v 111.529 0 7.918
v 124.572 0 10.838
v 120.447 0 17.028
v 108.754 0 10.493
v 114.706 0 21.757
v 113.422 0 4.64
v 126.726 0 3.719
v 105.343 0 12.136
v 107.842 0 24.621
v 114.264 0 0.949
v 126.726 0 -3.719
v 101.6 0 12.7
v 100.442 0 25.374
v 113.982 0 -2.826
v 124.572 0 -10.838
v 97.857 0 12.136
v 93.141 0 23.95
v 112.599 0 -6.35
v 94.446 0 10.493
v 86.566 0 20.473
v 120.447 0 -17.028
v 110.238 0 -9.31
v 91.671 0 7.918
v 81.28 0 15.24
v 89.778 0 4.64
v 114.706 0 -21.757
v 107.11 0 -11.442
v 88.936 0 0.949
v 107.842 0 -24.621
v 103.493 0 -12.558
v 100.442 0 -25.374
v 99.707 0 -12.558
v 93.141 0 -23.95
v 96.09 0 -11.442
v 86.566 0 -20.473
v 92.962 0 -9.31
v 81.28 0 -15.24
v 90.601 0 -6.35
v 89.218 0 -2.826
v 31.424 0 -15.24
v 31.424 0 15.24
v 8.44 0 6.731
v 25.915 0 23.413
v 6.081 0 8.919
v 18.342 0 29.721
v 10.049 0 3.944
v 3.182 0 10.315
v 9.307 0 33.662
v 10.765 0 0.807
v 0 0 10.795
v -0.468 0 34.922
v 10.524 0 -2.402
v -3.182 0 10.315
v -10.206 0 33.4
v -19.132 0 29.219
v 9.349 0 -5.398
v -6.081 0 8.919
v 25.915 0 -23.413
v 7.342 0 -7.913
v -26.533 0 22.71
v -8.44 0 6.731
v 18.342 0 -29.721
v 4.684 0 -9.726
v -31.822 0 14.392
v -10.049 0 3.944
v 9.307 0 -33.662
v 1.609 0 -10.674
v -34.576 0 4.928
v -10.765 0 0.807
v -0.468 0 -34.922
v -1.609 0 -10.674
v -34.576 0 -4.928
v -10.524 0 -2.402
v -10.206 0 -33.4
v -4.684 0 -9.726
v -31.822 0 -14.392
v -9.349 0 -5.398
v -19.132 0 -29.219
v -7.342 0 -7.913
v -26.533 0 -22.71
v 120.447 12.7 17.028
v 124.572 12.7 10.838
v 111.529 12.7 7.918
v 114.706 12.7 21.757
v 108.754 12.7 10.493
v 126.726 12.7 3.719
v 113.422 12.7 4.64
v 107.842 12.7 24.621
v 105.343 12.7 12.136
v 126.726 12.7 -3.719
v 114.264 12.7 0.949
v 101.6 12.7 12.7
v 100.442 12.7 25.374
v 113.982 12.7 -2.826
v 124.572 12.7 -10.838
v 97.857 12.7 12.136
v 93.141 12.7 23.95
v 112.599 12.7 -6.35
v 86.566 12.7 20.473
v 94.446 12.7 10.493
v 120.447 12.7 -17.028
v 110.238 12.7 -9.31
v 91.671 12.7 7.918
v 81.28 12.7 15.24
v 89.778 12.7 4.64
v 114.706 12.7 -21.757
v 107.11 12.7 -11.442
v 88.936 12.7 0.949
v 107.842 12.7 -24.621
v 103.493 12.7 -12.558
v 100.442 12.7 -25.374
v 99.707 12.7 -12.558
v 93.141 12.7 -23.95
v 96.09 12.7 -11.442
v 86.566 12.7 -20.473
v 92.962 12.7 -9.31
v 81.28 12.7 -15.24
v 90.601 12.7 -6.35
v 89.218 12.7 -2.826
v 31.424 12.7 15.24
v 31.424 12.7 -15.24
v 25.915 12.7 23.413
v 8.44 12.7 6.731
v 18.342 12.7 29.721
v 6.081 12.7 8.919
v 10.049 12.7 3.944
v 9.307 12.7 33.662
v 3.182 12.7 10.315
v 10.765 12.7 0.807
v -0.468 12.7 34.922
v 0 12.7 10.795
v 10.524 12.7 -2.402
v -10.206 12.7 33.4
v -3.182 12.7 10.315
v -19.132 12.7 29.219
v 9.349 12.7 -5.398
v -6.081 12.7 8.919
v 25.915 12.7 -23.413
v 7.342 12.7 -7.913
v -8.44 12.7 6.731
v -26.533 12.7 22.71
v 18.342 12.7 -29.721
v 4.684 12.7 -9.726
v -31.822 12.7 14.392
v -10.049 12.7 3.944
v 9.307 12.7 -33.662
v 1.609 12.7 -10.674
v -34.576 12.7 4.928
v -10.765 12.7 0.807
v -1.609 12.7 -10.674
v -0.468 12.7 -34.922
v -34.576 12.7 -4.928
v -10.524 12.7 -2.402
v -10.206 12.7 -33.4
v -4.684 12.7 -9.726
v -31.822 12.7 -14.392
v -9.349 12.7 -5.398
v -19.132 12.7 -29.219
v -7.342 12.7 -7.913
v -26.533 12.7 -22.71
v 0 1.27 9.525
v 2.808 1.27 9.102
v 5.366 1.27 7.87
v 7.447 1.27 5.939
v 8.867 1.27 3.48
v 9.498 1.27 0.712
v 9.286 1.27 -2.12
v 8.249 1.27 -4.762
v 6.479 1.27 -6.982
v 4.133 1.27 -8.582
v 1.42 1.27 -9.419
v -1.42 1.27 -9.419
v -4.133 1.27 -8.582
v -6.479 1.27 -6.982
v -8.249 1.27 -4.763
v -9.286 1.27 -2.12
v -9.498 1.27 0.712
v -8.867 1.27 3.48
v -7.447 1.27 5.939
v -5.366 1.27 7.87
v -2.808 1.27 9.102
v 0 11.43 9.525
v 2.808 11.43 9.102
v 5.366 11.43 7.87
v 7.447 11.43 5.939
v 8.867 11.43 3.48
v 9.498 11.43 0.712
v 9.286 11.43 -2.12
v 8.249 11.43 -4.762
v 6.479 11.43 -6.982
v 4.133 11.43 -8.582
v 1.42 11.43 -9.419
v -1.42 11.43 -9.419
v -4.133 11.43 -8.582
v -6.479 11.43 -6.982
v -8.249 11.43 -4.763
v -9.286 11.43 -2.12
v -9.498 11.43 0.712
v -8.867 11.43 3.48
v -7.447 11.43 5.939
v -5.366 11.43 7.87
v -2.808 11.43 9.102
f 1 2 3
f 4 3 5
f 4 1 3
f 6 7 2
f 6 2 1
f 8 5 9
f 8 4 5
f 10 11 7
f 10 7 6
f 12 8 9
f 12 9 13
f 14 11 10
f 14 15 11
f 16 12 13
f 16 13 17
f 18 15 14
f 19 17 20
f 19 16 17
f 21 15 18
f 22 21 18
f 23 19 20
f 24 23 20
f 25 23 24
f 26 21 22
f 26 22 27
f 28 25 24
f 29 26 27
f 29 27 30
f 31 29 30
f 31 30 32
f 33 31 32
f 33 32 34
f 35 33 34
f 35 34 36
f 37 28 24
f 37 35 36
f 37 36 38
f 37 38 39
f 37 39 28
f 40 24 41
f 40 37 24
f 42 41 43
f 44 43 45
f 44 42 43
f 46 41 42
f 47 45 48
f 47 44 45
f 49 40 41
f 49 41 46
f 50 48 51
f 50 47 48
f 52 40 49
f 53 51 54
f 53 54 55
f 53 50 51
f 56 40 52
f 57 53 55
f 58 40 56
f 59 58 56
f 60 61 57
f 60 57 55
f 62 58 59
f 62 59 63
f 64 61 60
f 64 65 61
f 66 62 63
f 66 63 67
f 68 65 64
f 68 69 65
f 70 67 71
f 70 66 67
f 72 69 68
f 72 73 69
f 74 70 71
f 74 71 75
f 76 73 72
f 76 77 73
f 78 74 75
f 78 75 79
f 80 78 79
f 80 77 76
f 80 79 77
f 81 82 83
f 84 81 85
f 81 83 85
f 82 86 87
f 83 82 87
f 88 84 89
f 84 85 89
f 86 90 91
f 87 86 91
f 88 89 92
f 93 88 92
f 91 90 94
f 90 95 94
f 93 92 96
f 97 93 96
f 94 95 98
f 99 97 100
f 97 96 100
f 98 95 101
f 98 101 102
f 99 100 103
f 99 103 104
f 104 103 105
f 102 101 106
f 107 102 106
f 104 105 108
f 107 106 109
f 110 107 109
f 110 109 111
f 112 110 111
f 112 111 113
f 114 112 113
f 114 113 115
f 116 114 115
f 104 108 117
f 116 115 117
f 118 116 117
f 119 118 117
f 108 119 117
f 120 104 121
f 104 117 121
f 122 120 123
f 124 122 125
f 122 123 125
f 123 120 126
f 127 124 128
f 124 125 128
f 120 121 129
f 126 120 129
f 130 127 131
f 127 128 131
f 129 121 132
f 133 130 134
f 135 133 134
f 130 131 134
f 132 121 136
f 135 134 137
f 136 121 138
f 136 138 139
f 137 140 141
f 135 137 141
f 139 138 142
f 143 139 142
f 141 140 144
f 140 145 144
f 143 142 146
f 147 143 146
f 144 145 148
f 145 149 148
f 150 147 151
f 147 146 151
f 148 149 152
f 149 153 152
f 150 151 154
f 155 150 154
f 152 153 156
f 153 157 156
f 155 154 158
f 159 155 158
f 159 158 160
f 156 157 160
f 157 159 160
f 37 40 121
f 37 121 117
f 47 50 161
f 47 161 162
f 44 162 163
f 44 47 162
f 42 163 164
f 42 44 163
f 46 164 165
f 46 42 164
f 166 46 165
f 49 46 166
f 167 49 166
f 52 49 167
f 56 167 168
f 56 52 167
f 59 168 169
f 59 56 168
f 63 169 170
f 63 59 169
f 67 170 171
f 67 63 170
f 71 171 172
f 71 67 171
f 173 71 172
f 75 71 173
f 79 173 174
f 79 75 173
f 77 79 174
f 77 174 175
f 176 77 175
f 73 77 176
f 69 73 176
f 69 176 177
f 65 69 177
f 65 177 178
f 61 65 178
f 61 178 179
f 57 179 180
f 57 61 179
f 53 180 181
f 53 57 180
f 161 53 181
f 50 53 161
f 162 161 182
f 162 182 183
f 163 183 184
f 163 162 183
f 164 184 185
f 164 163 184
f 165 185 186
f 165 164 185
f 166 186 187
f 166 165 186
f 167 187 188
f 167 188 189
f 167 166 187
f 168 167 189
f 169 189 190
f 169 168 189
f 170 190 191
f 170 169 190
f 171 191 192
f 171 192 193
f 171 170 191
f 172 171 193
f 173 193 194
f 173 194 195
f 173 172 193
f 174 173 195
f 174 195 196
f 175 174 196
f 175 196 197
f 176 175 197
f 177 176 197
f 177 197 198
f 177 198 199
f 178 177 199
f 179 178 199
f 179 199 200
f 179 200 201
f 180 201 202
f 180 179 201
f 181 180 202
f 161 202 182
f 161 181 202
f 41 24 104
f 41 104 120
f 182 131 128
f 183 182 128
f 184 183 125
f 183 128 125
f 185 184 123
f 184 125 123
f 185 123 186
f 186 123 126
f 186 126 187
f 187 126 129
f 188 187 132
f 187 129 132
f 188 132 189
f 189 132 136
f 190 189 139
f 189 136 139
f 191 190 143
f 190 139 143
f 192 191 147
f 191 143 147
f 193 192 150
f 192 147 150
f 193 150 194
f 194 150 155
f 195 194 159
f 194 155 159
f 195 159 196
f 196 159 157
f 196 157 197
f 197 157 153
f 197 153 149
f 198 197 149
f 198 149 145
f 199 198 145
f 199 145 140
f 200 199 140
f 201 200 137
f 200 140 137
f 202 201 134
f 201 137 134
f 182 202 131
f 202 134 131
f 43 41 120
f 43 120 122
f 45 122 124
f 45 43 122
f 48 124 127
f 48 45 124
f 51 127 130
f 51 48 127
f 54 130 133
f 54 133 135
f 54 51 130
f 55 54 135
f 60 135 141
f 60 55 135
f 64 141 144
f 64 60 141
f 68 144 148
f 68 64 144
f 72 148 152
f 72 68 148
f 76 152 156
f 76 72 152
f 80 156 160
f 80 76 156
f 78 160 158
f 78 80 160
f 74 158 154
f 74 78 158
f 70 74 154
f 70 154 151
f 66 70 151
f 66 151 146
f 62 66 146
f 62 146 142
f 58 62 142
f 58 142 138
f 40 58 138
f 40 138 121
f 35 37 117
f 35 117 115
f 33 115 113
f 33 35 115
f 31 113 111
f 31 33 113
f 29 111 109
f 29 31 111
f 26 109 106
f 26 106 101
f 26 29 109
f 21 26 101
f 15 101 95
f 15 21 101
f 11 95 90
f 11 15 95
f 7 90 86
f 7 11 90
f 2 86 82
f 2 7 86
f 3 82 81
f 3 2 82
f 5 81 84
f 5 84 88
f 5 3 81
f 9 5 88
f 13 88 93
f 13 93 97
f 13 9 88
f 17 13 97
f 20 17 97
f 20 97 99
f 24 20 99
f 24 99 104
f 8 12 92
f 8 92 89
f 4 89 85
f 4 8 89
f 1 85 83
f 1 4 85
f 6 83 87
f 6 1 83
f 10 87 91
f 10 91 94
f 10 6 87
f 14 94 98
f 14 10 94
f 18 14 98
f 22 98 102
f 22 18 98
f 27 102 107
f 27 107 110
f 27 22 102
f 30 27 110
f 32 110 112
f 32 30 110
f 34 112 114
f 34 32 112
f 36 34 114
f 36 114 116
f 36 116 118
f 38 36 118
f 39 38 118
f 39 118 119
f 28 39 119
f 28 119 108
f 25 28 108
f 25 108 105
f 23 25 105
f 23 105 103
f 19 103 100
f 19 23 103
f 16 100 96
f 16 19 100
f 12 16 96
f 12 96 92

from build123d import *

# Parameters (mm, degrees)
SKETCH1_R           = 9.525
SKETCH1_R_2         = 12.7
BOSS_EXTRUDE1_DEPTH = 12.7
CHAMFER1_SIZE       = 1.27


with BuildPart() as part:
    # Sketch1 → Boss-Extrude1 (new body)
    with BuildSketch(Plane(origin=(0, 0, 0), x_dir=(1, 0, 0), z_dir=(0, 1, 0))):
        with BuildLine():
            Line((31.4244813, 15.24), (81.28, 15.24))
            ThreePointArc((81.28, 15.24), (127, 0), (81.28, -15.24))
            Line((81.28, -15.24), (31.4244813, -15.24))
            ThreePointArc((31.4244813, -15.24), (-34.925, 0), (31.4244813, 15.24))
        make_face()
        with Locations(Location((0, 0, 0), (0, 0, 270))):
            Circle(SKETCH1_R, mode=Mode.SUBTRACT)
        with Locations(Location((101.6, 0, 0), (0, 0, 270))):
            Circle(SKETCH1_R_2, mode=Mode.SUBTRACT)
    extrude(amount=BOSS_EXTRUDE1_DEPTH)

    # Chamfer1
    chamfer1_edges = [part.edges().sort_by_distance(p)[0] for p in [
        (0, 0, -9.525),
        (0, 12.7, -9.525),
    ]]
    chamfer(chamfer1_edges, length=CHAMFER1_SIZE)


solid = part.part
